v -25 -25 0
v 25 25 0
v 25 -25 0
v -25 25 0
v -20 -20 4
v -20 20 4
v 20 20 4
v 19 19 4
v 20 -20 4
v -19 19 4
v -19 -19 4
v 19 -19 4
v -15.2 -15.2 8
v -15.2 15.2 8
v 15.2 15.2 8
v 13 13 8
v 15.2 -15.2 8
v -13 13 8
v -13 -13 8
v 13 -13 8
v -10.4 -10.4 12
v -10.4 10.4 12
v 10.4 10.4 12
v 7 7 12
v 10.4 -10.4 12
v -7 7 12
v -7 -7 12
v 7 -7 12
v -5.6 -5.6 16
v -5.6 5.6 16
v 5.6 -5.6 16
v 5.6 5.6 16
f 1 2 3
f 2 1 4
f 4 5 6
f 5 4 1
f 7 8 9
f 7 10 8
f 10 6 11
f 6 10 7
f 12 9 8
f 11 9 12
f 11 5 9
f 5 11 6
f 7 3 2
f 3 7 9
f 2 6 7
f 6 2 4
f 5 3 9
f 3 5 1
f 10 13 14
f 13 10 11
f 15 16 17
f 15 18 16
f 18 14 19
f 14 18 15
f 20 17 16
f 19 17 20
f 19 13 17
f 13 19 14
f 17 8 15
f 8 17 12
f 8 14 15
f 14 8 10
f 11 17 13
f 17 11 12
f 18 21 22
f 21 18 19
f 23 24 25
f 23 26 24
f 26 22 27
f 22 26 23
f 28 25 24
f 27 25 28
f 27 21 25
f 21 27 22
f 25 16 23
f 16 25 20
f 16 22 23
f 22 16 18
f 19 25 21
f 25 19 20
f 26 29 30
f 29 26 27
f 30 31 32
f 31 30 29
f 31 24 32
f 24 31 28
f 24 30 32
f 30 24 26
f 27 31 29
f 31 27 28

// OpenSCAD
  
     alturaPyramid=4;
     niveles=3;
     baseInicial=50;
for(i=[0:niveles]){
    translate([0,0,i*alturaPyramid])
    linear_extrude(height = alturaPyramid, scale = 0.8)
            square([baseInicial-i*alturaPyramid*3, baseInicial-i*alturaPyramid*3], center = true);

}
